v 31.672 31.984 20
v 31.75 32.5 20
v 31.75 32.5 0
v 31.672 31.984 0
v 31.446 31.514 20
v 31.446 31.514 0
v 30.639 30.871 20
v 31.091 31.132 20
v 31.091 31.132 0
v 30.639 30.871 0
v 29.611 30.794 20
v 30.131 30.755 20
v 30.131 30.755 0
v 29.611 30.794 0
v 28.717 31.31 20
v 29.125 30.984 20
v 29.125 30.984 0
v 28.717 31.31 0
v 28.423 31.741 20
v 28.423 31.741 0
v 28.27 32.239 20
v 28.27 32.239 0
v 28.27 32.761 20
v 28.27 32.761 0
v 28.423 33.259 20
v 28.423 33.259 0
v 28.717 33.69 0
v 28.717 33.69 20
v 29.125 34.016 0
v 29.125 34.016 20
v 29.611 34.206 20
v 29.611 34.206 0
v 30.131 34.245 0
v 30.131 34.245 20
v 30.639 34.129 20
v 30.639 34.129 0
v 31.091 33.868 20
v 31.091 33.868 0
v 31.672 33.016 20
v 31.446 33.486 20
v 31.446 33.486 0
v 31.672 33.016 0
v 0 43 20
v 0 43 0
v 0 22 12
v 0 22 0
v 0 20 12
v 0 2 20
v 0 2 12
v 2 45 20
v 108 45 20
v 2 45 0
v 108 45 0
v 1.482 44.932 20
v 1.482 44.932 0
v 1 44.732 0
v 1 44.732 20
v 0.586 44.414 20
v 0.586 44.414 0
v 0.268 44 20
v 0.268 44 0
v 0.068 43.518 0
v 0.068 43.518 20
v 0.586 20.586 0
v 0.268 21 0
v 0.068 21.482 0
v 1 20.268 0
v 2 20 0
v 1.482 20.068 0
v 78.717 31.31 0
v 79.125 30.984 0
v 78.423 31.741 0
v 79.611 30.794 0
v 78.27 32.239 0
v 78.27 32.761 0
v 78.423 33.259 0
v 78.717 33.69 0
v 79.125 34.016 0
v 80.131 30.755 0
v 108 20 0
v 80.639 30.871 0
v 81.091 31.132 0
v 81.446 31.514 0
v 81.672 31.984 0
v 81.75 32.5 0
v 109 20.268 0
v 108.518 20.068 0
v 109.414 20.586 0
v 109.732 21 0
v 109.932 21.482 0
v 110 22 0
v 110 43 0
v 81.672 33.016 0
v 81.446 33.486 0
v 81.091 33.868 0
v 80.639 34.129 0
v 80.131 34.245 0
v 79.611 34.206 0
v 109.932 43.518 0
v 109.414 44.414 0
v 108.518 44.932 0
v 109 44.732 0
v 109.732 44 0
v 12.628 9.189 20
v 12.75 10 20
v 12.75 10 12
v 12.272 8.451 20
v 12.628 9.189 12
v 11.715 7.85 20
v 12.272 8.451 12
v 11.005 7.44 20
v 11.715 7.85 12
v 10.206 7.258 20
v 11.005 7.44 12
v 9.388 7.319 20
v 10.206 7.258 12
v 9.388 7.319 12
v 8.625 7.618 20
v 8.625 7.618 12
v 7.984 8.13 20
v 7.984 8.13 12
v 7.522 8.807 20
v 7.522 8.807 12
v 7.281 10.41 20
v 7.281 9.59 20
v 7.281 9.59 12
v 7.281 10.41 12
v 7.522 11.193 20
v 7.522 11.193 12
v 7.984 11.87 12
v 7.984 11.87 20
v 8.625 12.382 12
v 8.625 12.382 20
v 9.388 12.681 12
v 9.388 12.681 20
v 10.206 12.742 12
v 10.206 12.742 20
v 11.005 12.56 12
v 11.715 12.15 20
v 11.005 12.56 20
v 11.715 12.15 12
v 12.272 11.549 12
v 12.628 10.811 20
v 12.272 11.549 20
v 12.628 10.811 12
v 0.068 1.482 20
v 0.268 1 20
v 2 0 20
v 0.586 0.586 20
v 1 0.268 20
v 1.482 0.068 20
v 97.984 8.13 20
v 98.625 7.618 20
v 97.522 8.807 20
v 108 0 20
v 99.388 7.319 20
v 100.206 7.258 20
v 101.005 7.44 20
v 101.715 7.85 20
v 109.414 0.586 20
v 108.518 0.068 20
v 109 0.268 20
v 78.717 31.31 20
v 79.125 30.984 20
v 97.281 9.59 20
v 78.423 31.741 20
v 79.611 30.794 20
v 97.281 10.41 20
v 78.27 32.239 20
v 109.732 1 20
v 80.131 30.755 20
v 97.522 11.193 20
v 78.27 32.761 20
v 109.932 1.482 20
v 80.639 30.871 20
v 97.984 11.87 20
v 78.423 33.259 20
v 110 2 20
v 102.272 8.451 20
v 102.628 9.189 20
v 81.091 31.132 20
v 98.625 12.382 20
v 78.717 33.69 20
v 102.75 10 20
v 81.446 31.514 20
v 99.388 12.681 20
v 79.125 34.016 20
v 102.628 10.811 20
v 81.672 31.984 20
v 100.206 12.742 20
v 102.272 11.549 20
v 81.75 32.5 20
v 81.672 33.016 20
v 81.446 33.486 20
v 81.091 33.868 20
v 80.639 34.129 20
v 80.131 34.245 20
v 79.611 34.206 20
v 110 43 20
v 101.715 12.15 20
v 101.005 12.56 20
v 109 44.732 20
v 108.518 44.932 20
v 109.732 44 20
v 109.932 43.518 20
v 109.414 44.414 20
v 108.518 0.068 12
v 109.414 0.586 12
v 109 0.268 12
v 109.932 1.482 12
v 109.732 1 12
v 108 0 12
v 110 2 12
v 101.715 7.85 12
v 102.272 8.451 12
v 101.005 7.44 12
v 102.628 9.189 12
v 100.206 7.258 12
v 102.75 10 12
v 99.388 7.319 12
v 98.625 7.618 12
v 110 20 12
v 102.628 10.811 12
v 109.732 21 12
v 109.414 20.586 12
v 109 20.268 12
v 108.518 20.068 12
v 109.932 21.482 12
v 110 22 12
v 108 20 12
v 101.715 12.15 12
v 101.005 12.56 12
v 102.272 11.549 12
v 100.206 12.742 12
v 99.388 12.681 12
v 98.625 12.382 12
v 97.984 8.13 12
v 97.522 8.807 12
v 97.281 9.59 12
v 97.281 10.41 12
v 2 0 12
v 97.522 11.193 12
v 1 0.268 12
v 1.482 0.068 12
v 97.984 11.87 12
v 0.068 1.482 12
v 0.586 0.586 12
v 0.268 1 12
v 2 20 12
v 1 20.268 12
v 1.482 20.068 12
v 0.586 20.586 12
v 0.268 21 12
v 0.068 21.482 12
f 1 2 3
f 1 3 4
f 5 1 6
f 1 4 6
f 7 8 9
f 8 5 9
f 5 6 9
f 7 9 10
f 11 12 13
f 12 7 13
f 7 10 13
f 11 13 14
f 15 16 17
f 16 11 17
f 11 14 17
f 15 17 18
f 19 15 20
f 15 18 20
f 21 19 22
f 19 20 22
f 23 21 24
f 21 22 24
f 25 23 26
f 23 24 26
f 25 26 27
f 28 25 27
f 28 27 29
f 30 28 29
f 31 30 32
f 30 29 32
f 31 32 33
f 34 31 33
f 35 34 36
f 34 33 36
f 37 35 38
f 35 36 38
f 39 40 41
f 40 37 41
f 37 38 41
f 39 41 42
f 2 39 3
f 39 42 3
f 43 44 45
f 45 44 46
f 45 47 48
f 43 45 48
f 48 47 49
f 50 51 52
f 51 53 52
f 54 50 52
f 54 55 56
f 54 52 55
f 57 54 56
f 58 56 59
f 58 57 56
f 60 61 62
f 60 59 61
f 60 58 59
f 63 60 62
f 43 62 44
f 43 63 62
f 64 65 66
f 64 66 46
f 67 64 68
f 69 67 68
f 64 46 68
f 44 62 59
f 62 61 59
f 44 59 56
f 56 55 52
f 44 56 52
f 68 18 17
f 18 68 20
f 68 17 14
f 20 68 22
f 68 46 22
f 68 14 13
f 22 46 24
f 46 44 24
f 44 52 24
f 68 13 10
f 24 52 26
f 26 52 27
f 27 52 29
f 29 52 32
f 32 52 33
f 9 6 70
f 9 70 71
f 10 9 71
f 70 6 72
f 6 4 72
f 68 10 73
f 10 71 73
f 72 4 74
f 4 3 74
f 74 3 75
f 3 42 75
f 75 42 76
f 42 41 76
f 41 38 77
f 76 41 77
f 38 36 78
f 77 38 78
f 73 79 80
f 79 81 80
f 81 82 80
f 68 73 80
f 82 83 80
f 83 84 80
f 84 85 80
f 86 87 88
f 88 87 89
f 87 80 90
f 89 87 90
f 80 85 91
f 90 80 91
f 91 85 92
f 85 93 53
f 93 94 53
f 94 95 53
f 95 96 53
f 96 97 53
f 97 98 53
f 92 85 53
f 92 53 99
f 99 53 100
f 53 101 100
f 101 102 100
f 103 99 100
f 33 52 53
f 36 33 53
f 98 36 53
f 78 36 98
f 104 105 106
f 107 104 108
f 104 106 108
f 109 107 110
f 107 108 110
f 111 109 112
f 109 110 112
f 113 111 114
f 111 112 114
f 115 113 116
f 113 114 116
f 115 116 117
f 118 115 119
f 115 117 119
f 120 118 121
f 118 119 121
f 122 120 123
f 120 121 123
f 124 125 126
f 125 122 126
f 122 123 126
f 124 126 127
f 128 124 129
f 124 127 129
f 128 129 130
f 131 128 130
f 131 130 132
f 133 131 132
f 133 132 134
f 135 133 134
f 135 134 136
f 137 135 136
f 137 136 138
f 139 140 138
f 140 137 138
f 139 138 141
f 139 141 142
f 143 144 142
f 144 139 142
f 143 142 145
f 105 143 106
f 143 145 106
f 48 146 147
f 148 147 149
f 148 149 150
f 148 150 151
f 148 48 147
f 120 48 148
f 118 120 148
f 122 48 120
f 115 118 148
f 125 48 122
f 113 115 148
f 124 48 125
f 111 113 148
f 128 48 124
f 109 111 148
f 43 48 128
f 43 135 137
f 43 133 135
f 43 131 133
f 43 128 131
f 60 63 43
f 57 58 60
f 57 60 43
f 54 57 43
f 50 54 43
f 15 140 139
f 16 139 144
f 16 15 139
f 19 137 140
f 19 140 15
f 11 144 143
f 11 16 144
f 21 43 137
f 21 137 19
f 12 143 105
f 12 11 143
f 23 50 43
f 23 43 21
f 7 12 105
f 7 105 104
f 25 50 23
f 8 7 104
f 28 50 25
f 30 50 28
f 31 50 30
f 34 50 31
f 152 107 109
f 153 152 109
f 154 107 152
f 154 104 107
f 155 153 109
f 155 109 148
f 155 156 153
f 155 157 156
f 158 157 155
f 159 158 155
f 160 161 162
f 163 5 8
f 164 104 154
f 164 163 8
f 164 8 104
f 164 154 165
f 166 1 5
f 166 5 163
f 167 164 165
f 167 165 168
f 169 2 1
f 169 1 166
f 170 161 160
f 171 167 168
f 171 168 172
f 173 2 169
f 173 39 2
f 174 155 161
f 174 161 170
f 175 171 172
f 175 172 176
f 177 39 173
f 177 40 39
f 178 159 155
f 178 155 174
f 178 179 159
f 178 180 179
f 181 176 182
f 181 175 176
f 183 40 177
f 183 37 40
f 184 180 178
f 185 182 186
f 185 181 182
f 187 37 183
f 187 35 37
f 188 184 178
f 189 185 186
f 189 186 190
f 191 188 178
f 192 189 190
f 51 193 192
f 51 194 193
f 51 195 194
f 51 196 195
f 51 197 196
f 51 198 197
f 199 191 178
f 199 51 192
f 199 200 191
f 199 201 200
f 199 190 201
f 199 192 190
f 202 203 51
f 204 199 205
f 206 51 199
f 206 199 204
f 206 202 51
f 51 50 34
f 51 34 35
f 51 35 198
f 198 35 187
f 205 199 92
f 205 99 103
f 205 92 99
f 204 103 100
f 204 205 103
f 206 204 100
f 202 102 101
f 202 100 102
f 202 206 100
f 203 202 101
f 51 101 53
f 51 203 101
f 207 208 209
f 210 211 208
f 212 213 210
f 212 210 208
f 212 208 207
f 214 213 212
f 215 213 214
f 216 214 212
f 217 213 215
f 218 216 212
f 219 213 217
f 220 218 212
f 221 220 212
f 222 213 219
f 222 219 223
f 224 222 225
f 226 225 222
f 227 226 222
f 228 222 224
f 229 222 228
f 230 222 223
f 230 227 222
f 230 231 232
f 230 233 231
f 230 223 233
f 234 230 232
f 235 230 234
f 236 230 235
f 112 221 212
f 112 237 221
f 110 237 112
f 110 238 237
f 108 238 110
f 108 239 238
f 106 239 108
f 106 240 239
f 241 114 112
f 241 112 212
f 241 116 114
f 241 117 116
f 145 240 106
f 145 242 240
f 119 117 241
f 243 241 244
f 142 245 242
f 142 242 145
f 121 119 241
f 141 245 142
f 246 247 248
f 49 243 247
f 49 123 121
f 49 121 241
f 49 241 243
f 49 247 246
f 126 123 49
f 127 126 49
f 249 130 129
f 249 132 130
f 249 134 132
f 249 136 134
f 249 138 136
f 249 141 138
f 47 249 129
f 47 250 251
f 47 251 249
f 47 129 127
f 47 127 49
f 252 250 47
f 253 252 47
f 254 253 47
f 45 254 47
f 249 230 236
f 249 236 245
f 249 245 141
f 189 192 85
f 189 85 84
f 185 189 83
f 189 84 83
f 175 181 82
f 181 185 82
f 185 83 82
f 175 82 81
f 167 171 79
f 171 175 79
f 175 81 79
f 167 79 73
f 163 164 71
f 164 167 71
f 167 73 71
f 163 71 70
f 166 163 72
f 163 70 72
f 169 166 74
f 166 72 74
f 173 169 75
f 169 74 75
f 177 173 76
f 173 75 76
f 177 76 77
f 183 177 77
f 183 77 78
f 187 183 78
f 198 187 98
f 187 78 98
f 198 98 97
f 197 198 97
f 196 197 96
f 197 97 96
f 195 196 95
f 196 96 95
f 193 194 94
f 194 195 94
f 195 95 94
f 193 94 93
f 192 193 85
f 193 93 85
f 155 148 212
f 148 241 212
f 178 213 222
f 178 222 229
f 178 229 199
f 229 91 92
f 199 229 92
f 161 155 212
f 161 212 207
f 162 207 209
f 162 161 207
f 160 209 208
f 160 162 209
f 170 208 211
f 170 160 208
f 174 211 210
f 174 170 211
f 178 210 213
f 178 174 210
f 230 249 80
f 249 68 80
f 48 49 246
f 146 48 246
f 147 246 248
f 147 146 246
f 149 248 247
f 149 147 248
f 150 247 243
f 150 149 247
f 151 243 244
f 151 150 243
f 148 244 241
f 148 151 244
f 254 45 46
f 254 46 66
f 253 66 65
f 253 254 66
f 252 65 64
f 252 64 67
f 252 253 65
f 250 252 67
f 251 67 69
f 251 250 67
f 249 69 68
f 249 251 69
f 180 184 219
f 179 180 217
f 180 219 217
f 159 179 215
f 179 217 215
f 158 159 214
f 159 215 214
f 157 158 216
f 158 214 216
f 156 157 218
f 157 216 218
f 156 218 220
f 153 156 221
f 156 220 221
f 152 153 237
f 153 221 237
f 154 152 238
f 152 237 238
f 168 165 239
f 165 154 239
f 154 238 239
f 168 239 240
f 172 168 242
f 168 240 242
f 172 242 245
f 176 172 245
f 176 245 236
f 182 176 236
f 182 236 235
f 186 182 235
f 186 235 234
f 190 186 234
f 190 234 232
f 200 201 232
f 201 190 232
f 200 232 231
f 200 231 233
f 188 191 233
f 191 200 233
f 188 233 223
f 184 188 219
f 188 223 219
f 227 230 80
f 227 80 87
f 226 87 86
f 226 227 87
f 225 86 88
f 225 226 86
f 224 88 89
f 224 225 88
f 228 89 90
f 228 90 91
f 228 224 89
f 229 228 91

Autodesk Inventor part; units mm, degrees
ref_plane "YZ Plane" through (0, 0, 0) normal (1, 0, 0) x (0, 1, 0)
ref_plane "XZ Plane" through (0, 0, 0) normal (0, 1, 0) x (-1, 0, 0)
ref_plane "XY Plane" through (0, 0, 0) normal (0, 0, 1) x (1, 0, 0)
sketch "スケッチ1" plane through (0, 0, 0) normal (0, 0, 1) x (1, 0, 0)
  line L0 (0, 0) -> (110, 0)
  line L1 (110, 0) -> (110, 45)
  line L2 (110, 45) -> (0, 45)
  line L3 (0, 45) -> (0, 0)
  line L4 (0, 32.5) -> (110, 32.5) construction
  line L5 (0, 10) -> (110, 10) construction
  circle A0 centre (10, 10) radius 2.75
  circle A1 centre (100, 10) radius 2.75
  circle A2 centre (30, 32.5) radius 1.75
  circle A3 centre (80, 32.5) radius 1.75
  line L6 (55, 45) -> (55, 0) construction
  dimension "d2" = 110
  dimension "d3" = 45
  dimension "d4" = 12.5
  dimension "d5" = 10
  dimension "d6" = 50
  dimension "d8" = 10
  dimension "d9" = 5.5
  dimension "d10" = 3.5
extrude "押し出し1" add sketch "スケッチ1" along normal blind 20
sketch "スケッチ2" plane through (0, 0, 0) normal (0, 0, -1) x (-1, 0, 0)
  line L0 (0, 0) -> (-110, 0) projected
  line L1 (-110, 0) -> (0, 0)
  line L2 (0, 0) -> (0, 20)
  line L3 (0, 20) -> (-110, 20)
  line L4 (-110, 20) -> (-110, 0)
  point P0 (-110, 45)
  dimension "d14" = 20
extrude "押し出し2" cut sketch "スケッチ2" against normal blind 12
fillet "フィレット1" radius 2 6 edges at (110, 0, 16) (110, 45, 10) (0, 0, 16) (0, 45, 10) (110, 20, 6) (0, 20, 6)
properties part number "_3D プリント"
